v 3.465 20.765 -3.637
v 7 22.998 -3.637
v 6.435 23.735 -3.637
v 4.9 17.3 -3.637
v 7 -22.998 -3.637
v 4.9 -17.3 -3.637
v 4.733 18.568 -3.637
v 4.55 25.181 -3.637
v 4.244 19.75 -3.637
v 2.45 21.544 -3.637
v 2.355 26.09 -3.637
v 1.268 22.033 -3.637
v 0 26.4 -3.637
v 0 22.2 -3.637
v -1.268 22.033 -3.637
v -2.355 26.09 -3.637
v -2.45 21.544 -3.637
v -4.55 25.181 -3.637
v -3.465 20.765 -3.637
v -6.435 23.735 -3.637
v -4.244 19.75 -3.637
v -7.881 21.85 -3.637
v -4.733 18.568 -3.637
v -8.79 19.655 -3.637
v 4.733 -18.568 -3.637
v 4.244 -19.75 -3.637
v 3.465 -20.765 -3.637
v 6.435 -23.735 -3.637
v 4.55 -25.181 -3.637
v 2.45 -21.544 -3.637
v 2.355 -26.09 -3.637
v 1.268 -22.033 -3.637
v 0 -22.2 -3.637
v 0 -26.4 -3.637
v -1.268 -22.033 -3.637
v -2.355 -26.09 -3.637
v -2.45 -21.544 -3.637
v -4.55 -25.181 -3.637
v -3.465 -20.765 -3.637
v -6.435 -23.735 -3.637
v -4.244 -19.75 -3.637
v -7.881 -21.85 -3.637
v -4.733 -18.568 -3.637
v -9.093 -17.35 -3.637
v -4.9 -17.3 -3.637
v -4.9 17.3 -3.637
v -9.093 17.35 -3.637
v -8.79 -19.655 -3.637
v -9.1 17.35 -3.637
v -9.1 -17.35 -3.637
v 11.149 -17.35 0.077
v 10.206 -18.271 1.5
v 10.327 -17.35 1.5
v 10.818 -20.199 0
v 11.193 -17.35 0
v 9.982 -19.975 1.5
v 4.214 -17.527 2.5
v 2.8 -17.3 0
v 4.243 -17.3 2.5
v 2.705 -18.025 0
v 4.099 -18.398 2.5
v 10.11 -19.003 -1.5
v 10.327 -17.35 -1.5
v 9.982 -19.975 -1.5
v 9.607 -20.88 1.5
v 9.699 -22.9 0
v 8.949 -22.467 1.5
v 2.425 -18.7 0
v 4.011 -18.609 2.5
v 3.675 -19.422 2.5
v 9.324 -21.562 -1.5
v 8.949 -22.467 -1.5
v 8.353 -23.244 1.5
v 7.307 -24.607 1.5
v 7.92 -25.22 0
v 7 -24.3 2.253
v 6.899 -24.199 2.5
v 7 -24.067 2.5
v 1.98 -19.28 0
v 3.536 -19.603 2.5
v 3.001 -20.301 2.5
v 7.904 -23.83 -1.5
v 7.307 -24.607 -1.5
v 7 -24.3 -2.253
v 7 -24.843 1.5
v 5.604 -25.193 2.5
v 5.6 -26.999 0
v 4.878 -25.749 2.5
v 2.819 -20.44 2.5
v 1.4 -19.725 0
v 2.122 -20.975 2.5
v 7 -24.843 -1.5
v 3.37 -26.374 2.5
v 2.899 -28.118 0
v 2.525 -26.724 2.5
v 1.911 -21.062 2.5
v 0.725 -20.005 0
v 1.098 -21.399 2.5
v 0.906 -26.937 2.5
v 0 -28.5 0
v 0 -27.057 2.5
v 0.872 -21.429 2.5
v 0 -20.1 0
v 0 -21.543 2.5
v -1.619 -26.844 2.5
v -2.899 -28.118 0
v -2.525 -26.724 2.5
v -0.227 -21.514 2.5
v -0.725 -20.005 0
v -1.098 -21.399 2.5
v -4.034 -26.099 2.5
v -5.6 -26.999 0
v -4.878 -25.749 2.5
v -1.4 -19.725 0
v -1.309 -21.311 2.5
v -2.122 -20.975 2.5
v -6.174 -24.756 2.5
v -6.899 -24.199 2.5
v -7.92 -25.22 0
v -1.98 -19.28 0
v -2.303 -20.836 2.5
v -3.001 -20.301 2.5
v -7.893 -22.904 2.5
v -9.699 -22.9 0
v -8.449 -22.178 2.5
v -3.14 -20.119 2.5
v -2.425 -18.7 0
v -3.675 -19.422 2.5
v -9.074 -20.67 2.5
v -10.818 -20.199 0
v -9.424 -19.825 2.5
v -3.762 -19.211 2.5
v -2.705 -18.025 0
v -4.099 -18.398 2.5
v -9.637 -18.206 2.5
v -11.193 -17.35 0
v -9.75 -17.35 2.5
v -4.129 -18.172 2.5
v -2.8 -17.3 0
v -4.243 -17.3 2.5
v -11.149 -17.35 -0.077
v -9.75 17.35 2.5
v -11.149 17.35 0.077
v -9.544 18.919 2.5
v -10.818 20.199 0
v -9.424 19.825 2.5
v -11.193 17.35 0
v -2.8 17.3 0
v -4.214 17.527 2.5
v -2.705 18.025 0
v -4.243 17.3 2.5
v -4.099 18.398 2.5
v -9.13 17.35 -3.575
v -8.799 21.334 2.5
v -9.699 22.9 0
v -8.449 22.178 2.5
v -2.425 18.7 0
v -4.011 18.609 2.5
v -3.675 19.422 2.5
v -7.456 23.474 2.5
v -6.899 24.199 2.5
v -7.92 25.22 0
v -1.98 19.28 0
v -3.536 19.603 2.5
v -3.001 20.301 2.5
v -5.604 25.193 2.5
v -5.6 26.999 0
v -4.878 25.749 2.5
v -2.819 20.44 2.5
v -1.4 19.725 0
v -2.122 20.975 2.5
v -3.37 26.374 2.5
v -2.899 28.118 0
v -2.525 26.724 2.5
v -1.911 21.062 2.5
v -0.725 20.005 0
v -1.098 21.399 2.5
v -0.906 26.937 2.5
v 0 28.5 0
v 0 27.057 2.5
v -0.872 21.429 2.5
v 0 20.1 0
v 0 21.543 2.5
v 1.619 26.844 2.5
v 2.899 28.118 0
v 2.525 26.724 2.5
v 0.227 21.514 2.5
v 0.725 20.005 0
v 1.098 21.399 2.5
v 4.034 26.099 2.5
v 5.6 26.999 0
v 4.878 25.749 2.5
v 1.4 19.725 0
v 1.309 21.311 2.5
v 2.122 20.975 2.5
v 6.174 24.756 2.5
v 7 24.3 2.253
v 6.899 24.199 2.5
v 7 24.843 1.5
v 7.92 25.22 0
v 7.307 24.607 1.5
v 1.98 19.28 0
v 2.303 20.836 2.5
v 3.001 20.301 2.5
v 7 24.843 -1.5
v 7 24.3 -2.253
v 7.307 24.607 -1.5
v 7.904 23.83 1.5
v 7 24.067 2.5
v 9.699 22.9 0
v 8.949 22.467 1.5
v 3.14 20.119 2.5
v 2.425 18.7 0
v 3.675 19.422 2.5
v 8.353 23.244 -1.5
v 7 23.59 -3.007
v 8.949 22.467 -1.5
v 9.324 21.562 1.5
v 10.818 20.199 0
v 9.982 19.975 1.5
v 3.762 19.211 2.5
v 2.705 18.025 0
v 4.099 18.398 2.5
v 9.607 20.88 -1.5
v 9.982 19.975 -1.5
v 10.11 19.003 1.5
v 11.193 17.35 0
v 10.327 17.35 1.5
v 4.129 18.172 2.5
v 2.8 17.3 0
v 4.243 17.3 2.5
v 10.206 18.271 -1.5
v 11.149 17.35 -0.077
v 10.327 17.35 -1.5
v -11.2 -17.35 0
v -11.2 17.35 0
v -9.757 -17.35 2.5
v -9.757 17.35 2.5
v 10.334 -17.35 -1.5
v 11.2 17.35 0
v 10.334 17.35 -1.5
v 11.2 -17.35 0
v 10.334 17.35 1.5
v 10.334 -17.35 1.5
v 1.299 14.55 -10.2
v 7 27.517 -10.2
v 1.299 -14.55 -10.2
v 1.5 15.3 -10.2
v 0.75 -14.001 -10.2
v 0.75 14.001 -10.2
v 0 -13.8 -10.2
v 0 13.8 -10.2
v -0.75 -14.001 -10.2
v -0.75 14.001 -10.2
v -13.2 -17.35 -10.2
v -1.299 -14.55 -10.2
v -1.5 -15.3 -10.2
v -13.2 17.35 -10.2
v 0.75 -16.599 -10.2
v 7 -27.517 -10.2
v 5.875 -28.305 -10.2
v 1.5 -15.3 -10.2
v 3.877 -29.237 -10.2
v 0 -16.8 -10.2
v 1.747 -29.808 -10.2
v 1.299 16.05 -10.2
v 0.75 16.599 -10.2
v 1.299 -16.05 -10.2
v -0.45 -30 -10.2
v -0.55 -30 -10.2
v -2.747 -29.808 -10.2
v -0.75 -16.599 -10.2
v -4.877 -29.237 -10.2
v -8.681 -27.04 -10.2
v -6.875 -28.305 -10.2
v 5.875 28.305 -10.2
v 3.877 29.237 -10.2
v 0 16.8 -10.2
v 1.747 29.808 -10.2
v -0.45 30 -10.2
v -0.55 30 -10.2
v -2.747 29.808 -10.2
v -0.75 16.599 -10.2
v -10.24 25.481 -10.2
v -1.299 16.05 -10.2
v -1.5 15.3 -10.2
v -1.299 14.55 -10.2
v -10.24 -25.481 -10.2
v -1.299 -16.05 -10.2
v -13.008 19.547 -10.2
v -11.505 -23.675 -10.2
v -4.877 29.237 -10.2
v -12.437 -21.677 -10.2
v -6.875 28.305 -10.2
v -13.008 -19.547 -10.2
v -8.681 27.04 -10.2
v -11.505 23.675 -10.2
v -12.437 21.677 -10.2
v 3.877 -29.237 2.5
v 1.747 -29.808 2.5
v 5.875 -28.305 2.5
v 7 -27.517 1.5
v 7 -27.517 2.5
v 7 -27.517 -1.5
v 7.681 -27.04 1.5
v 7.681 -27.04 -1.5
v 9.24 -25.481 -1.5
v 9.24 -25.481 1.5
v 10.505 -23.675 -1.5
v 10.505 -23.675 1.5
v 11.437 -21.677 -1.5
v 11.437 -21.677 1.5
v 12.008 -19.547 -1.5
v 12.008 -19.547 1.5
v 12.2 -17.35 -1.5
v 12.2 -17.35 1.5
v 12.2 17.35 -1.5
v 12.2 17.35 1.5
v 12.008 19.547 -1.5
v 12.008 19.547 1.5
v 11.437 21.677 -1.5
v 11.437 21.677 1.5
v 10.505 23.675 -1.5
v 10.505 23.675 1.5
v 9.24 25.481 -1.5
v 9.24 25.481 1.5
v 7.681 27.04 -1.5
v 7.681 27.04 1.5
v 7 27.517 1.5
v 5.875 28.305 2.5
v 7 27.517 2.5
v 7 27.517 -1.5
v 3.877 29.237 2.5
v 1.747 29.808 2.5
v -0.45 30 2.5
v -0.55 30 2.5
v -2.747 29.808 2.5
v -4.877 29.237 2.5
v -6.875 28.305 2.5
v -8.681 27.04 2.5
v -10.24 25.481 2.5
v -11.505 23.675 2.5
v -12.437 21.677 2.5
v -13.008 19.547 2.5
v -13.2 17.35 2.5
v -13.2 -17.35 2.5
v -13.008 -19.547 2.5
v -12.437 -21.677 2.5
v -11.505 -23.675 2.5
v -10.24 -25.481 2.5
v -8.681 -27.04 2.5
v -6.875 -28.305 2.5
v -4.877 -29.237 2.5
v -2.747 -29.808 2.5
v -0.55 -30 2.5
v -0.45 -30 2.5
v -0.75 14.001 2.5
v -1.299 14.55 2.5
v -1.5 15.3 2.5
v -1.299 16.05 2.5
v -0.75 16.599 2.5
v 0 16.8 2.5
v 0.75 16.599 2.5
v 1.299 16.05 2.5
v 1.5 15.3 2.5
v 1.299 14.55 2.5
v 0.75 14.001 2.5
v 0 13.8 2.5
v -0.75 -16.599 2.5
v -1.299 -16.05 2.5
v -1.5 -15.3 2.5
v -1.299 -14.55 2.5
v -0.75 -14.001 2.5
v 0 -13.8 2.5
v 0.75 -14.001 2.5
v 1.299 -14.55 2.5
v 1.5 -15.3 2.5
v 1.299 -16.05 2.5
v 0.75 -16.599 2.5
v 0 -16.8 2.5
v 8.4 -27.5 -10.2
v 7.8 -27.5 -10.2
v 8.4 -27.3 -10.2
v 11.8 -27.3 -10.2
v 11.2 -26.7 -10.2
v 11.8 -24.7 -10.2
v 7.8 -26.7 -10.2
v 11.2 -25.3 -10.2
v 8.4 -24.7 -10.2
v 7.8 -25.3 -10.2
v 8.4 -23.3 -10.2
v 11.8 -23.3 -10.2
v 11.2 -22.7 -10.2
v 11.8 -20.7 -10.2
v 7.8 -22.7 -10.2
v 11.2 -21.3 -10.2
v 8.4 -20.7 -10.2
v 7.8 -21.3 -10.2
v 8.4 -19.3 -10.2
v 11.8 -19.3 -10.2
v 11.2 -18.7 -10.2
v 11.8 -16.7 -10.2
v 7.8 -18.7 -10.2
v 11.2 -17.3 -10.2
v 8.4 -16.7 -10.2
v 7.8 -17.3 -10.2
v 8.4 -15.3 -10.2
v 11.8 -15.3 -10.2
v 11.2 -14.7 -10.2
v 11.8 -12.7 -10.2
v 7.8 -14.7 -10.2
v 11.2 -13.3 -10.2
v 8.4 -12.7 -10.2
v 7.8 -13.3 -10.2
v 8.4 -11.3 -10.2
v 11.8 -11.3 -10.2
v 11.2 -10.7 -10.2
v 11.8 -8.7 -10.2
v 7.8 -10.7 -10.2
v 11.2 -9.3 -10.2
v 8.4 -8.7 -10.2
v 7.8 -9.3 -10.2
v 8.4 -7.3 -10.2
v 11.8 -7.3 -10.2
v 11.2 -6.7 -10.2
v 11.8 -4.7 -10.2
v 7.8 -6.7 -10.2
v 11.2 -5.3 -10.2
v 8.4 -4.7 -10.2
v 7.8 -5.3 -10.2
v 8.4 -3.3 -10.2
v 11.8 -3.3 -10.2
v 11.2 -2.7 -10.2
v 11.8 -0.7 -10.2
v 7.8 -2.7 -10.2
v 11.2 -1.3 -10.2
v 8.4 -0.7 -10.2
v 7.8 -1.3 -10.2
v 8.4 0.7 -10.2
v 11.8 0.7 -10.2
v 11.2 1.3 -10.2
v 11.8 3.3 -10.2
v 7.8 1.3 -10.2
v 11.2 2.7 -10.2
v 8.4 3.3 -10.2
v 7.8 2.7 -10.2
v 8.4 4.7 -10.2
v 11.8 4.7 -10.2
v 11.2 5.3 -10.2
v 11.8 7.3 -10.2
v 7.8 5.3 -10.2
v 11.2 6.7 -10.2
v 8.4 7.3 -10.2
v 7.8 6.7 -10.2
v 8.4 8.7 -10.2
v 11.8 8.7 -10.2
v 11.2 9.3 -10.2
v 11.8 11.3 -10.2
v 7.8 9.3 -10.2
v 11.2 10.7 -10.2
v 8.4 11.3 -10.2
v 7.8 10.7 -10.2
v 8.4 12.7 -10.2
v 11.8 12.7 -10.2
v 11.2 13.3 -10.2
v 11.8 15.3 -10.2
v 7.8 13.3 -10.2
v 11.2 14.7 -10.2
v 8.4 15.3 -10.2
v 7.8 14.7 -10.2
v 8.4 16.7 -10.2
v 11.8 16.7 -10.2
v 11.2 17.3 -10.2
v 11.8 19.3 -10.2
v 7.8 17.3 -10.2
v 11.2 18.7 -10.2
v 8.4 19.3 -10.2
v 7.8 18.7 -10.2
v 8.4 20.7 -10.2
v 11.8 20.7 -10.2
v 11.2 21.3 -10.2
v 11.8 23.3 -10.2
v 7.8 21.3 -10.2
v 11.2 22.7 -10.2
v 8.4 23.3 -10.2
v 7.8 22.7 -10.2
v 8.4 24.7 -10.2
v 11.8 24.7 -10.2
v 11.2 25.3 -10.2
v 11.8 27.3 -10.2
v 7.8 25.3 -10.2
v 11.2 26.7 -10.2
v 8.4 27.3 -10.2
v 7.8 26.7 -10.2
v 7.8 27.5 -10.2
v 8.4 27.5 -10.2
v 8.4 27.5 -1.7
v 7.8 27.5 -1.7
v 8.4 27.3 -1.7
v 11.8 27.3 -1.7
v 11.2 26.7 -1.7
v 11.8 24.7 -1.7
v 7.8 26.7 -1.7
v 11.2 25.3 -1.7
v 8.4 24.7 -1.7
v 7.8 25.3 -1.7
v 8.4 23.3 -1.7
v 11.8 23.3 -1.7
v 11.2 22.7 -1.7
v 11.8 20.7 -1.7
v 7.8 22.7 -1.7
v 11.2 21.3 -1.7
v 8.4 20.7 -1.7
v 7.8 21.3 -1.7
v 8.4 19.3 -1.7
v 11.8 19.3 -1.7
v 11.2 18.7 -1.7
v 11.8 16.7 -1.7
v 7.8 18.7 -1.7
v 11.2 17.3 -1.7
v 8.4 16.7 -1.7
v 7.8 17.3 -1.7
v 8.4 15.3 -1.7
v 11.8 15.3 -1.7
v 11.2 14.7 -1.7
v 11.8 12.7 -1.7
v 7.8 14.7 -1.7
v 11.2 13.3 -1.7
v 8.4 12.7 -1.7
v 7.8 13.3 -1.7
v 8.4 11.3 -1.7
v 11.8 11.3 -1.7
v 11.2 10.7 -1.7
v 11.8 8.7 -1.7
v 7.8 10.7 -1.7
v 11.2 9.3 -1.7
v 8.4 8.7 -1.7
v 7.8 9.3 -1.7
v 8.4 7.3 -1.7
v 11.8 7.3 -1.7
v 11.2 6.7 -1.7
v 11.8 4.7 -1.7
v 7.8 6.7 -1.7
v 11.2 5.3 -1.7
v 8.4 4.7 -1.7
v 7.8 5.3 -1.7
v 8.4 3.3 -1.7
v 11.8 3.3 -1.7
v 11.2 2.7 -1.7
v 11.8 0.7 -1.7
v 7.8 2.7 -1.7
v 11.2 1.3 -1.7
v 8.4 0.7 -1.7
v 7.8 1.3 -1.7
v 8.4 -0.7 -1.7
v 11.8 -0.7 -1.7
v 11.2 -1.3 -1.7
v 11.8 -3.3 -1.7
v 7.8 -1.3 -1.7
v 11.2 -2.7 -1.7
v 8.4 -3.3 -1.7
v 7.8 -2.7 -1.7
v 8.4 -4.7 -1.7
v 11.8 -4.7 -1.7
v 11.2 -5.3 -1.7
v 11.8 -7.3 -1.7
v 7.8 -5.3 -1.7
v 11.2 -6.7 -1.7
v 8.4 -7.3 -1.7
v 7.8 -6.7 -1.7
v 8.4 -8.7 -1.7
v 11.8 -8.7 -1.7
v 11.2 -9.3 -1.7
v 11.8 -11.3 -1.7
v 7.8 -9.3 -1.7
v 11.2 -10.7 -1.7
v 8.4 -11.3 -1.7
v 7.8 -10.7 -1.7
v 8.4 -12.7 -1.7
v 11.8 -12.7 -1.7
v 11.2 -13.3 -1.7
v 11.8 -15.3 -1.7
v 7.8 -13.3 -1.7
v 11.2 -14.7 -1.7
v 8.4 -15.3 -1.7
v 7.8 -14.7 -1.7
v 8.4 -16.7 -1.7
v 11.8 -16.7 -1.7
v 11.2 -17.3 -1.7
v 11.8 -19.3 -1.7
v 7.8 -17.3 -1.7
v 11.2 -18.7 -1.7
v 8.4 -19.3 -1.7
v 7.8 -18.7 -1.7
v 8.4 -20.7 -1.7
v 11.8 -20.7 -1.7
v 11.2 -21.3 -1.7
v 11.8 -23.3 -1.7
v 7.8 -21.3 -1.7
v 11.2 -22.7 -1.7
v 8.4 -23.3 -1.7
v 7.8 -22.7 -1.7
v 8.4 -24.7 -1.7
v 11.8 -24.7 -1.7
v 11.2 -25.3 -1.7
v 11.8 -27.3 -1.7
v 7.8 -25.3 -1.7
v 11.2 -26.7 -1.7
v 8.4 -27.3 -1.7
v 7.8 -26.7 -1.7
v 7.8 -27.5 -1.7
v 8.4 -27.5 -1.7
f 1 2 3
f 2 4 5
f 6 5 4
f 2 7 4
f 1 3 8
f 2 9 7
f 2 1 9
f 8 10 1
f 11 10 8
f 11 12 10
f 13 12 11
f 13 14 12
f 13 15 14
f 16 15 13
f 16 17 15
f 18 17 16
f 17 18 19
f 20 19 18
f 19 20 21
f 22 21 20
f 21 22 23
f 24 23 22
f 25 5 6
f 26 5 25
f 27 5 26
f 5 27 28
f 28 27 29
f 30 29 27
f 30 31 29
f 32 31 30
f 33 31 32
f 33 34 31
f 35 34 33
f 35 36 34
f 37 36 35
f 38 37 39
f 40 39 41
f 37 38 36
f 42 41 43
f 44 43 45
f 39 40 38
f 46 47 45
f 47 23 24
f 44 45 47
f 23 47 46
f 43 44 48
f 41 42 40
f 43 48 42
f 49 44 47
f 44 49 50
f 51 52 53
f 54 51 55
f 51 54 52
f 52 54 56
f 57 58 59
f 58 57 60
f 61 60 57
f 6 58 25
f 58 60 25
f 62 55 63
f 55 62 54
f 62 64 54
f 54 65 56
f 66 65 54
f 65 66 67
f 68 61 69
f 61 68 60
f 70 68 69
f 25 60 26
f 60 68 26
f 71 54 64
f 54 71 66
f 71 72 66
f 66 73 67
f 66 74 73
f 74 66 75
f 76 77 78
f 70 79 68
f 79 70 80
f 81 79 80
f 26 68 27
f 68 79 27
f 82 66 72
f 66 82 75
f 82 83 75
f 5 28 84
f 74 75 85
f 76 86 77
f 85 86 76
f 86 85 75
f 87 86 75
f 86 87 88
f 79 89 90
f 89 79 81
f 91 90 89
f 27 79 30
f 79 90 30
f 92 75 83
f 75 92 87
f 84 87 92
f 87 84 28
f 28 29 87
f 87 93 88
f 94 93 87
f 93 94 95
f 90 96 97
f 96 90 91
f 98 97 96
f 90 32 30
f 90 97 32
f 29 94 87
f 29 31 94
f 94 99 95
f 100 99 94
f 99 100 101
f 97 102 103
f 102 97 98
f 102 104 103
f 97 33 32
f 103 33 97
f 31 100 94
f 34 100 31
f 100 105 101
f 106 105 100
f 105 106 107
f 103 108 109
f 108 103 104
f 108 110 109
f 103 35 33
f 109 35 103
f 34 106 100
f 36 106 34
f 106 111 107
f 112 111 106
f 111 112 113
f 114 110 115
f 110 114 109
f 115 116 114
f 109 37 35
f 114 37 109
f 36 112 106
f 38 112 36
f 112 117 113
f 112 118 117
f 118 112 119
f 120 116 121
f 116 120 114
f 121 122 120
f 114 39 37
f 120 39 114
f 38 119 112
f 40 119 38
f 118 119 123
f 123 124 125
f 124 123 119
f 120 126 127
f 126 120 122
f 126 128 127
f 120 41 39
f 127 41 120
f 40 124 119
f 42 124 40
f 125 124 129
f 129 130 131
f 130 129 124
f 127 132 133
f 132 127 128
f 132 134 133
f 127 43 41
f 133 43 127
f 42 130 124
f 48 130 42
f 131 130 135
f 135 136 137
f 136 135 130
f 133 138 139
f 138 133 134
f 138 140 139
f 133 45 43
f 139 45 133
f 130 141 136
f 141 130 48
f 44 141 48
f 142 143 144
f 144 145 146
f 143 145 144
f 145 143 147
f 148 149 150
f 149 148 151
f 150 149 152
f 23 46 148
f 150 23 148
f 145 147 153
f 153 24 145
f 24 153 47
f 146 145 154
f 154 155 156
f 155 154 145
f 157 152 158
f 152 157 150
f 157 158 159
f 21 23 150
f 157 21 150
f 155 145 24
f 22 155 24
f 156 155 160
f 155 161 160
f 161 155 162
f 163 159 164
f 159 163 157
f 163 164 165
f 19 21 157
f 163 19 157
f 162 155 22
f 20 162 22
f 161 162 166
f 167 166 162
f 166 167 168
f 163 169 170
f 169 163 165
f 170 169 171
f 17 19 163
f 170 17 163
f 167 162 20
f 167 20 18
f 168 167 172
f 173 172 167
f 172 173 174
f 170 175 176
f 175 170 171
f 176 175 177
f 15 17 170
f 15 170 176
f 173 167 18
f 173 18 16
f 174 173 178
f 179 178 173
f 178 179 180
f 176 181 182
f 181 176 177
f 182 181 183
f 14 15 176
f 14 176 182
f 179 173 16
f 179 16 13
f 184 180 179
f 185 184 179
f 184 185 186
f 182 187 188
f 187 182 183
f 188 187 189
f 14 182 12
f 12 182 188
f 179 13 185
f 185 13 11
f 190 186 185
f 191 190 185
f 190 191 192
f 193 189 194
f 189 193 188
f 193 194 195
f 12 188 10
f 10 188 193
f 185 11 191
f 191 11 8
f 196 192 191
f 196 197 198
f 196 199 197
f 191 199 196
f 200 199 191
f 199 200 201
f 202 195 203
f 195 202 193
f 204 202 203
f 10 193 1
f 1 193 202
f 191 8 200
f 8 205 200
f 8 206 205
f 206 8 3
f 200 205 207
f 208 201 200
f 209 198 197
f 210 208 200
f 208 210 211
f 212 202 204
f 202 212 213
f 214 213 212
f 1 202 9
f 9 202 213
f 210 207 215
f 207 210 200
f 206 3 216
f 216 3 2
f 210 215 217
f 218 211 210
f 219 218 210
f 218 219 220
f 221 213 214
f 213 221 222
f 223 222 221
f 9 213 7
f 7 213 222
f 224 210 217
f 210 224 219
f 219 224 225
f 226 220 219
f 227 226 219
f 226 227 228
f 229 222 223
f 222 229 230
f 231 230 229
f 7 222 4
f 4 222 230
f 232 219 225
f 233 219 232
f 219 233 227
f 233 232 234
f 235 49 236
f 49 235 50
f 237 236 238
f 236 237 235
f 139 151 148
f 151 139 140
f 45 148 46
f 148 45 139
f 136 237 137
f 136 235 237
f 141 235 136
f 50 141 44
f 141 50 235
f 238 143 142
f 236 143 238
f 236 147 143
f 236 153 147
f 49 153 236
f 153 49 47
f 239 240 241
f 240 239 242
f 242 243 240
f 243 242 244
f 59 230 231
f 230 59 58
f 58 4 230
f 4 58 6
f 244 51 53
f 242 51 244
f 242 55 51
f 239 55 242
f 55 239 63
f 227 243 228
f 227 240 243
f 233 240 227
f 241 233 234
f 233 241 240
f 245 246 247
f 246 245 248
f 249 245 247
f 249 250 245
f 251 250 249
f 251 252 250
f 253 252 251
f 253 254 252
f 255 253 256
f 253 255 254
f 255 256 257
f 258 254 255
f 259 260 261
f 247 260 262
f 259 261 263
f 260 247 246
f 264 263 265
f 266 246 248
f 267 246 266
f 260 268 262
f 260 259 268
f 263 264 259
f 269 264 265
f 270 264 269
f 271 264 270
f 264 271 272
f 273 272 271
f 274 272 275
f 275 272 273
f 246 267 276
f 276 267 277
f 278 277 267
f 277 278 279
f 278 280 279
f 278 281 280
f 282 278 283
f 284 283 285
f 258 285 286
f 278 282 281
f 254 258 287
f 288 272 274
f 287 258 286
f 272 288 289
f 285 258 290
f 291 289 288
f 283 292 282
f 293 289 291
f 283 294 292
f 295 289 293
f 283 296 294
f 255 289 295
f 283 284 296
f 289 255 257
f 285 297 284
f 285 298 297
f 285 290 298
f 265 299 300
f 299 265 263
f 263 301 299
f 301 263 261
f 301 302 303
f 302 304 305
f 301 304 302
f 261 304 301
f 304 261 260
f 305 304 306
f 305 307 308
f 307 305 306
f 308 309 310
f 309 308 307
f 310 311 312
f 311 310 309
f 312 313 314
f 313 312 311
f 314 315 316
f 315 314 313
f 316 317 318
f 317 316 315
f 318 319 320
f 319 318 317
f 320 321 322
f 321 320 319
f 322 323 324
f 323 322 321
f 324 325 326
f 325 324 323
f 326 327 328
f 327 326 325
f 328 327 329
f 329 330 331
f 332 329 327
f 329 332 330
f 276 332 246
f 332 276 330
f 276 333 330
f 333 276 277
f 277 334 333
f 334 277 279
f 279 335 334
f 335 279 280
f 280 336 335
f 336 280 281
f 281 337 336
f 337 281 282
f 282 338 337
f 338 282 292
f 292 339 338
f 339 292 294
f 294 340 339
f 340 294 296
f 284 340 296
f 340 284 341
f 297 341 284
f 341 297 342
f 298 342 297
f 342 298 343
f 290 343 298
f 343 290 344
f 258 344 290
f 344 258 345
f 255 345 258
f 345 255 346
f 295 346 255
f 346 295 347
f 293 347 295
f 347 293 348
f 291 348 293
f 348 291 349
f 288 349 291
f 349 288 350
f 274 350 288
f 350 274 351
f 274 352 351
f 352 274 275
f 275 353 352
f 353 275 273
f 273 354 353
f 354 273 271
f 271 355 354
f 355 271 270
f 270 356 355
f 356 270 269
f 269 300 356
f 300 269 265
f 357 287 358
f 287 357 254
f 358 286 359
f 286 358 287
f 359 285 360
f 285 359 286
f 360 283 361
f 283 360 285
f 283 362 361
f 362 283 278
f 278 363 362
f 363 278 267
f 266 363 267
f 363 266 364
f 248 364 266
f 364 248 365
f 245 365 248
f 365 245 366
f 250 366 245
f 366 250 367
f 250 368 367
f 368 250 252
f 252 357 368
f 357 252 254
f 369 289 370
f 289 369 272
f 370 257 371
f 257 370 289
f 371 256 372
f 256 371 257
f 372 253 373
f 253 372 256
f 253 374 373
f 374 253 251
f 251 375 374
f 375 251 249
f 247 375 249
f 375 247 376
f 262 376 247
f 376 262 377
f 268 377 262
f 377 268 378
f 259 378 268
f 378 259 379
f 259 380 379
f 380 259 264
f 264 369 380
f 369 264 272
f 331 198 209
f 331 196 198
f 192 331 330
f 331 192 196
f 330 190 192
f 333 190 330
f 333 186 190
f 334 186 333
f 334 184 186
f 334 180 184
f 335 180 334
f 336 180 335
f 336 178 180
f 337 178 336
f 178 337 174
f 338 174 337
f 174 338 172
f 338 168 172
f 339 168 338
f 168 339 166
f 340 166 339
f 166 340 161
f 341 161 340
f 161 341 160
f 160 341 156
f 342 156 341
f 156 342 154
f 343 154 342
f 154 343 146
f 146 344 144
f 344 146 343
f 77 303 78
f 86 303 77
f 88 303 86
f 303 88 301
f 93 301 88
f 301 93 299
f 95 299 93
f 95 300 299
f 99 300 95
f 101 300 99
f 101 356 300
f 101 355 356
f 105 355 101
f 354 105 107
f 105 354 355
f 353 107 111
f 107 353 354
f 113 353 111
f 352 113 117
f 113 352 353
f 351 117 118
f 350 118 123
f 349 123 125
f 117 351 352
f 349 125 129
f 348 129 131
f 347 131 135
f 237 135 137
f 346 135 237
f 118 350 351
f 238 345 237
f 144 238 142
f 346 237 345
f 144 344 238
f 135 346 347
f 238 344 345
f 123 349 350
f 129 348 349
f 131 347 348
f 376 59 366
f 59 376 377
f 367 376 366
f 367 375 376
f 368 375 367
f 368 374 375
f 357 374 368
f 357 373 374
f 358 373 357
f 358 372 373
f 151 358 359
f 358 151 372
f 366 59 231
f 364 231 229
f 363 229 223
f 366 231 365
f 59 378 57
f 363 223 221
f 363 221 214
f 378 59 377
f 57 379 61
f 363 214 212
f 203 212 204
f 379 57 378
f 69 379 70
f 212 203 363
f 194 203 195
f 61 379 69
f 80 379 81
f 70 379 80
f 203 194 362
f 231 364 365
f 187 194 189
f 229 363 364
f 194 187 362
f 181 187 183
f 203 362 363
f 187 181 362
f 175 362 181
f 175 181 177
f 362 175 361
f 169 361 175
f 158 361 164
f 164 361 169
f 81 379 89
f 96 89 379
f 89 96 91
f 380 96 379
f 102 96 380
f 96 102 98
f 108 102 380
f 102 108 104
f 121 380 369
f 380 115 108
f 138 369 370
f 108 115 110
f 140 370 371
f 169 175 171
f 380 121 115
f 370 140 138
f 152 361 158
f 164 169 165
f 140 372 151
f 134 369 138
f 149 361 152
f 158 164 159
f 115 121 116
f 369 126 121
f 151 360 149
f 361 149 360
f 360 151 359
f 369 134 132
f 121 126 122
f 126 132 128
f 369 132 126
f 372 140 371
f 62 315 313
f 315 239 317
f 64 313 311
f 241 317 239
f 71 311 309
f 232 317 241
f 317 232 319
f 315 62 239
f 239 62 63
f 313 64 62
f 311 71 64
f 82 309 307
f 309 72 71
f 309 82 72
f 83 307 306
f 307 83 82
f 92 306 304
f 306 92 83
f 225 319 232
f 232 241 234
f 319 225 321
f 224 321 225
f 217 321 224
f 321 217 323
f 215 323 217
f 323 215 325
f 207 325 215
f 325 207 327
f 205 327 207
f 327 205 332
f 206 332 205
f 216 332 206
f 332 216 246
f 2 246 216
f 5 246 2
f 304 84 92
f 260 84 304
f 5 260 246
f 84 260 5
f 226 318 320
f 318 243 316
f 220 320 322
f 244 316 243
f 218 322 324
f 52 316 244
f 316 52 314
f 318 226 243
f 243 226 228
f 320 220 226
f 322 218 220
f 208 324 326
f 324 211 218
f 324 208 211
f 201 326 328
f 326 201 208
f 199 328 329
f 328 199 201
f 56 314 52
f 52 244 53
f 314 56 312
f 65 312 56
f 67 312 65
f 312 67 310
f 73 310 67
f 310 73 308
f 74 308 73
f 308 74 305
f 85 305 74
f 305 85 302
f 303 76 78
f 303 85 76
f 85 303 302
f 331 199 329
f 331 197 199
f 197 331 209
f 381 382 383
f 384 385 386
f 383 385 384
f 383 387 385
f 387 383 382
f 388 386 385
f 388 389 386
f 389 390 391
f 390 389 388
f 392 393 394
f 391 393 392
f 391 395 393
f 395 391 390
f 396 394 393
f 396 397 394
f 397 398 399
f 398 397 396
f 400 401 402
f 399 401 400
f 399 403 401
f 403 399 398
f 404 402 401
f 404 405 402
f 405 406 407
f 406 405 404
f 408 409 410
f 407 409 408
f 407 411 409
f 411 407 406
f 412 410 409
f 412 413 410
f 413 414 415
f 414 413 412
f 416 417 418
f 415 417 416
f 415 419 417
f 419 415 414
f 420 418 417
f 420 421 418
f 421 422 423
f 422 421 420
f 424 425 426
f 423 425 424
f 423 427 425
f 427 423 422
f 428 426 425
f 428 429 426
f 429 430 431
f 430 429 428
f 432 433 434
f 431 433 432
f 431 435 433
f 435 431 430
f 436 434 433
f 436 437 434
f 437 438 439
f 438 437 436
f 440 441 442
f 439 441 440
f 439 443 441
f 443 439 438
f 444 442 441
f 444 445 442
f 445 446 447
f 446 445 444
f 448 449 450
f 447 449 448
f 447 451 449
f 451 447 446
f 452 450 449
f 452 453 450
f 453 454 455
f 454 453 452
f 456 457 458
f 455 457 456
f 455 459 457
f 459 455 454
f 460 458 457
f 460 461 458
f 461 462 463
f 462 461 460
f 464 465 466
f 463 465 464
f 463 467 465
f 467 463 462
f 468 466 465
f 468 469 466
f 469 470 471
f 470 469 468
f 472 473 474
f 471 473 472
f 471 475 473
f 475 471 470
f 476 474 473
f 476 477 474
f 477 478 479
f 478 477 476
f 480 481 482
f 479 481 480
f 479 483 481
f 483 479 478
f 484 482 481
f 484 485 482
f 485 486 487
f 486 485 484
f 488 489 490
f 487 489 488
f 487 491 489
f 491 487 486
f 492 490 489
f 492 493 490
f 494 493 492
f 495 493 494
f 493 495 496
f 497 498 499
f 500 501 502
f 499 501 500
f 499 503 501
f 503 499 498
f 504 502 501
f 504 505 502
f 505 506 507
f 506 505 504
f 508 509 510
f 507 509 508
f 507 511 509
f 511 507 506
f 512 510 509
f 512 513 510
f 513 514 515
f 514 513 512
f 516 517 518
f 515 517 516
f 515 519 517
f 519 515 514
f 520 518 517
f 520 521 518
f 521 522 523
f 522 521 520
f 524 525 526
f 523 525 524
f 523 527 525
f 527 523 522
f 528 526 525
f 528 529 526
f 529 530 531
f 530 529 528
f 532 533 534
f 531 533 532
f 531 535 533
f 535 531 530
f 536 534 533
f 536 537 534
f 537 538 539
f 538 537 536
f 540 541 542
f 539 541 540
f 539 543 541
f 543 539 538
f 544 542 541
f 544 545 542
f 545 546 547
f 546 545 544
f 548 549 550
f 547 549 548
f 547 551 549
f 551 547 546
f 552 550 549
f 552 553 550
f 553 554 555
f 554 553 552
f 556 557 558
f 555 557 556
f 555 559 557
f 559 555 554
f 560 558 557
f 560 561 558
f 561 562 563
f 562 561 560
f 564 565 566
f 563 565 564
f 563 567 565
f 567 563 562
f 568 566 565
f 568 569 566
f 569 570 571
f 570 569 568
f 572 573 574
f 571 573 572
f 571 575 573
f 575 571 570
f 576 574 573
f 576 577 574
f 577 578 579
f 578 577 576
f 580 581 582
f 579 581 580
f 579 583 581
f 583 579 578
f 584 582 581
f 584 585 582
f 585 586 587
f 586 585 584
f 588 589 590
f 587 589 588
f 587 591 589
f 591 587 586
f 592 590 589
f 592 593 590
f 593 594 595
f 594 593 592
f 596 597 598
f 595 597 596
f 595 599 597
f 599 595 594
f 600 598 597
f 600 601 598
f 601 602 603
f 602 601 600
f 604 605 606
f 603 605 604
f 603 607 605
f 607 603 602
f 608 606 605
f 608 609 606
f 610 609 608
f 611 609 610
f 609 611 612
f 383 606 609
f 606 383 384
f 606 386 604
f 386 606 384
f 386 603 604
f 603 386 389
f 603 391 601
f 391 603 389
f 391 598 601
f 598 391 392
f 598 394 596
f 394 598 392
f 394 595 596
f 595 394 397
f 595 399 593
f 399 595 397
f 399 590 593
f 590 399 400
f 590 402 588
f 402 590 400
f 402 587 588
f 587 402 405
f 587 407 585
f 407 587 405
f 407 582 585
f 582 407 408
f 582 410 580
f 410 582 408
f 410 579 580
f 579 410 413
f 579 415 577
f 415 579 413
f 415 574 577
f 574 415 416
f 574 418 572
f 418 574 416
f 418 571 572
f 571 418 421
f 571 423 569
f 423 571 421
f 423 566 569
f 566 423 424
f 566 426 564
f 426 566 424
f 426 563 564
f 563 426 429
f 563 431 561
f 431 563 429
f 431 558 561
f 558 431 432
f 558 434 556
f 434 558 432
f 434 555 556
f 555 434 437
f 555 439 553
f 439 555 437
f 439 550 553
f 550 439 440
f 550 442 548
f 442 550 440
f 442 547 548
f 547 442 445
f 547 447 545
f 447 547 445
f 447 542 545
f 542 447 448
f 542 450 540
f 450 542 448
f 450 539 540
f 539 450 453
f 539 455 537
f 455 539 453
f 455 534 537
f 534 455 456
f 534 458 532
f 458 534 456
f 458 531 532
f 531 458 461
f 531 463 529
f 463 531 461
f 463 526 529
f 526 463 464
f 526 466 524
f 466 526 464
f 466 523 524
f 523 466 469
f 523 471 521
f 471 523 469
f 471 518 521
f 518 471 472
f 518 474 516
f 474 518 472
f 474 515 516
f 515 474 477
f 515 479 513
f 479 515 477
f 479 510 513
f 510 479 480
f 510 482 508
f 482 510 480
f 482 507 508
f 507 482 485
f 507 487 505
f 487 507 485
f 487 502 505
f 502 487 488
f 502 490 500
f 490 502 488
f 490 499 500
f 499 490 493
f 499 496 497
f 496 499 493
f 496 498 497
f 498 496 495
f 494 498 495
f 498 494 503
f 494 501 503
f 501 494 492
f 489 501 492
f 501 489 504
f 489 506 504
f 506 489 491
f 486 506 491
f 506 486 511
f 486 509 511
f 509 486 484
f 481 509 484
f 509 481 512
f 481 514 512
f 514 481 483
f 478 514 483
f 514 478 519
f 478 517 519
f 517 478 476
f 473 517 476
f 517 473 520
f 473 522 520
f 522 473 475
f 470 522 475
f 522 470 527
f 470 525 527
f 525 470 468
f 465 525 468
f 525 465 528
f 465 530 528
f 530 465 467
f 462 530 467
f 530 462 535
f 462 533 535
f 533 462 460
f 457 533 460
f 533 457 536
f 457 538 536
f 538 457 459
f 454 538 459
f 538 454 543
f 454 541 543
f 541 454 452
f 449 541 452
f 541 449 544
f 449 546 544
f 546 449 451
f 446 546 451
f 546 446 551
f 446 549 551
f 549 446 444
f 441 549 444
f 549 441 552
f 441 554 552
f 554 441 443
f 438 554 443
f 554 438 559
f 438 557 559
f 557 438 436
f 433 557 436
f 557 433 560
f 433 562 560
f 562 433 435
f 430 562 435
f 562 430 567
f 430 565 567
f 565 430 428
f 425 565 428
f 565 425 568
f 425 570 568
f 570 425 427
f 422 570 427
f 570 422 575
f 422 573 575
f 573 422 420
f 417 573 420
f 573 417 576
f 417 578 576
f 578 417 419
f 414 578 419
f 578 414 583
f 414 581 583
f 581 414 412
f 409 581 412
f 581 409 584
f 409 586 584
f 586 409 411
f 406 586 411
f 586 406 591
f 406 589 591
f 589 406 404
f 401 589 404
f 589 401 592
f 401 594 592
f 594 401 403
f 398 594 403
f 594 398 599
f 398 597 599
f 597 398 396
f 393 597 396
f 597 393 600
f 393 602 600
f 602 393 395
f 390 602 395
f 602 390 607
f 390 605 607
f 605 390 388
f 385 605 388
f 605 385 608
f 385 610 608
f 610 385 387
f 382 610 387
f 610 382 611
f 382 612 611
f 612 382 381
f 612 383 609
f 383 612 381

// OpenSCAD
length = 60;
thickness = 13;
channel_radius = 4.2;
track_radius = 7;
outside_radius = channel_radius + track_radius + 1.5;
slot = 3;

module track(h) {
  union() {
    translate([0, outside_radius-length/2, 0]) intersection() {
      rotate_extrude($fn=24) translate([track_radius, 0, 0])
        circle(r=channel_radius, $fn=6);
      translate([0, -20, 0]) cube([40, 40, 40], center=true);
    }
    translate([0, length/2-outside_radius, 0]) intersection() {
      rotate_extrude($fn=24) translate([track_radius, 0, 0])
        circle(r=channel_radius, $fn=6);
      translate([0, 20, 0]) cube([40, 40, 40], center=true);
    }
    for (s = [-1, 1]) {
      scale([s, 1, 1])
        translate([track_radius, 0, 0]) rotate([90, 0, 0]) {
          cylinder(r=channel_radius,
                   h=length-2*outside_radius+0.1,
                   center=true, $fn=6);
          translate([0, 2, 0]) #
            cylinder(r=channel_radius*0.61,
                     h=length-2*outside_radius+0.1,
                     center=true, $fn=6);
      }
    }
  }
}

module support(h, w) {
  linear_extrude(height=h, convexity=2) {
    difference() {
      square([4, length-5], center=true);
      for (y = [-length:4:length]) {
        translate([w, y]) square([4, 2-w], center=true);
        translate([-w, y+2]) square([4, 2-w], center=true);
      }
    }
  }
}

module half() {
  difference() {
    translate([0, 0, slot/2-thickness+1.3])
    linear_extrude(height=30, convexity=2) {
      difference() {
        translate([-0.5, 0, 0]) minkowski() {
          square([0.1, 0.1+length-2*outside_radius], center=true);
          circle(r=outside_radius-0.05, $fn=36);
        }
        for (y = [2+outside_radius-length/2,
                  length/2-outside_radius-2]) {
          translate([0, y])
            circle(r=1.5, $fn=12);
        }
      }
    }
    track();
    translate([-10.5, 0, 12.5]) difference() {
      cube([100, 100, 20], center=true);
    }
    translate([0, 0, 10]) rotate([0, -90, 0]) {
      rotate([0, 0, 90]) cylinder(r=3.2, h=50, $fn=6);
      cylinder(r=1.7, h=50, center=true, $fn=12);
    }
    translate([10+track_radius, 0, -10-slot/2])
      cube([20, length, 20], center=true);
    translate([10+track_radius, 0, 10+slot/2])
      cube([20, length, 20], center=true);
  }
}

half(1.5);
translate([9.8, 0, slot/2-thickness+1.3]) support(h=8.5, w=0.6);

translate([20, 0, 0]) % cube([20, 100, 20], center=true);
